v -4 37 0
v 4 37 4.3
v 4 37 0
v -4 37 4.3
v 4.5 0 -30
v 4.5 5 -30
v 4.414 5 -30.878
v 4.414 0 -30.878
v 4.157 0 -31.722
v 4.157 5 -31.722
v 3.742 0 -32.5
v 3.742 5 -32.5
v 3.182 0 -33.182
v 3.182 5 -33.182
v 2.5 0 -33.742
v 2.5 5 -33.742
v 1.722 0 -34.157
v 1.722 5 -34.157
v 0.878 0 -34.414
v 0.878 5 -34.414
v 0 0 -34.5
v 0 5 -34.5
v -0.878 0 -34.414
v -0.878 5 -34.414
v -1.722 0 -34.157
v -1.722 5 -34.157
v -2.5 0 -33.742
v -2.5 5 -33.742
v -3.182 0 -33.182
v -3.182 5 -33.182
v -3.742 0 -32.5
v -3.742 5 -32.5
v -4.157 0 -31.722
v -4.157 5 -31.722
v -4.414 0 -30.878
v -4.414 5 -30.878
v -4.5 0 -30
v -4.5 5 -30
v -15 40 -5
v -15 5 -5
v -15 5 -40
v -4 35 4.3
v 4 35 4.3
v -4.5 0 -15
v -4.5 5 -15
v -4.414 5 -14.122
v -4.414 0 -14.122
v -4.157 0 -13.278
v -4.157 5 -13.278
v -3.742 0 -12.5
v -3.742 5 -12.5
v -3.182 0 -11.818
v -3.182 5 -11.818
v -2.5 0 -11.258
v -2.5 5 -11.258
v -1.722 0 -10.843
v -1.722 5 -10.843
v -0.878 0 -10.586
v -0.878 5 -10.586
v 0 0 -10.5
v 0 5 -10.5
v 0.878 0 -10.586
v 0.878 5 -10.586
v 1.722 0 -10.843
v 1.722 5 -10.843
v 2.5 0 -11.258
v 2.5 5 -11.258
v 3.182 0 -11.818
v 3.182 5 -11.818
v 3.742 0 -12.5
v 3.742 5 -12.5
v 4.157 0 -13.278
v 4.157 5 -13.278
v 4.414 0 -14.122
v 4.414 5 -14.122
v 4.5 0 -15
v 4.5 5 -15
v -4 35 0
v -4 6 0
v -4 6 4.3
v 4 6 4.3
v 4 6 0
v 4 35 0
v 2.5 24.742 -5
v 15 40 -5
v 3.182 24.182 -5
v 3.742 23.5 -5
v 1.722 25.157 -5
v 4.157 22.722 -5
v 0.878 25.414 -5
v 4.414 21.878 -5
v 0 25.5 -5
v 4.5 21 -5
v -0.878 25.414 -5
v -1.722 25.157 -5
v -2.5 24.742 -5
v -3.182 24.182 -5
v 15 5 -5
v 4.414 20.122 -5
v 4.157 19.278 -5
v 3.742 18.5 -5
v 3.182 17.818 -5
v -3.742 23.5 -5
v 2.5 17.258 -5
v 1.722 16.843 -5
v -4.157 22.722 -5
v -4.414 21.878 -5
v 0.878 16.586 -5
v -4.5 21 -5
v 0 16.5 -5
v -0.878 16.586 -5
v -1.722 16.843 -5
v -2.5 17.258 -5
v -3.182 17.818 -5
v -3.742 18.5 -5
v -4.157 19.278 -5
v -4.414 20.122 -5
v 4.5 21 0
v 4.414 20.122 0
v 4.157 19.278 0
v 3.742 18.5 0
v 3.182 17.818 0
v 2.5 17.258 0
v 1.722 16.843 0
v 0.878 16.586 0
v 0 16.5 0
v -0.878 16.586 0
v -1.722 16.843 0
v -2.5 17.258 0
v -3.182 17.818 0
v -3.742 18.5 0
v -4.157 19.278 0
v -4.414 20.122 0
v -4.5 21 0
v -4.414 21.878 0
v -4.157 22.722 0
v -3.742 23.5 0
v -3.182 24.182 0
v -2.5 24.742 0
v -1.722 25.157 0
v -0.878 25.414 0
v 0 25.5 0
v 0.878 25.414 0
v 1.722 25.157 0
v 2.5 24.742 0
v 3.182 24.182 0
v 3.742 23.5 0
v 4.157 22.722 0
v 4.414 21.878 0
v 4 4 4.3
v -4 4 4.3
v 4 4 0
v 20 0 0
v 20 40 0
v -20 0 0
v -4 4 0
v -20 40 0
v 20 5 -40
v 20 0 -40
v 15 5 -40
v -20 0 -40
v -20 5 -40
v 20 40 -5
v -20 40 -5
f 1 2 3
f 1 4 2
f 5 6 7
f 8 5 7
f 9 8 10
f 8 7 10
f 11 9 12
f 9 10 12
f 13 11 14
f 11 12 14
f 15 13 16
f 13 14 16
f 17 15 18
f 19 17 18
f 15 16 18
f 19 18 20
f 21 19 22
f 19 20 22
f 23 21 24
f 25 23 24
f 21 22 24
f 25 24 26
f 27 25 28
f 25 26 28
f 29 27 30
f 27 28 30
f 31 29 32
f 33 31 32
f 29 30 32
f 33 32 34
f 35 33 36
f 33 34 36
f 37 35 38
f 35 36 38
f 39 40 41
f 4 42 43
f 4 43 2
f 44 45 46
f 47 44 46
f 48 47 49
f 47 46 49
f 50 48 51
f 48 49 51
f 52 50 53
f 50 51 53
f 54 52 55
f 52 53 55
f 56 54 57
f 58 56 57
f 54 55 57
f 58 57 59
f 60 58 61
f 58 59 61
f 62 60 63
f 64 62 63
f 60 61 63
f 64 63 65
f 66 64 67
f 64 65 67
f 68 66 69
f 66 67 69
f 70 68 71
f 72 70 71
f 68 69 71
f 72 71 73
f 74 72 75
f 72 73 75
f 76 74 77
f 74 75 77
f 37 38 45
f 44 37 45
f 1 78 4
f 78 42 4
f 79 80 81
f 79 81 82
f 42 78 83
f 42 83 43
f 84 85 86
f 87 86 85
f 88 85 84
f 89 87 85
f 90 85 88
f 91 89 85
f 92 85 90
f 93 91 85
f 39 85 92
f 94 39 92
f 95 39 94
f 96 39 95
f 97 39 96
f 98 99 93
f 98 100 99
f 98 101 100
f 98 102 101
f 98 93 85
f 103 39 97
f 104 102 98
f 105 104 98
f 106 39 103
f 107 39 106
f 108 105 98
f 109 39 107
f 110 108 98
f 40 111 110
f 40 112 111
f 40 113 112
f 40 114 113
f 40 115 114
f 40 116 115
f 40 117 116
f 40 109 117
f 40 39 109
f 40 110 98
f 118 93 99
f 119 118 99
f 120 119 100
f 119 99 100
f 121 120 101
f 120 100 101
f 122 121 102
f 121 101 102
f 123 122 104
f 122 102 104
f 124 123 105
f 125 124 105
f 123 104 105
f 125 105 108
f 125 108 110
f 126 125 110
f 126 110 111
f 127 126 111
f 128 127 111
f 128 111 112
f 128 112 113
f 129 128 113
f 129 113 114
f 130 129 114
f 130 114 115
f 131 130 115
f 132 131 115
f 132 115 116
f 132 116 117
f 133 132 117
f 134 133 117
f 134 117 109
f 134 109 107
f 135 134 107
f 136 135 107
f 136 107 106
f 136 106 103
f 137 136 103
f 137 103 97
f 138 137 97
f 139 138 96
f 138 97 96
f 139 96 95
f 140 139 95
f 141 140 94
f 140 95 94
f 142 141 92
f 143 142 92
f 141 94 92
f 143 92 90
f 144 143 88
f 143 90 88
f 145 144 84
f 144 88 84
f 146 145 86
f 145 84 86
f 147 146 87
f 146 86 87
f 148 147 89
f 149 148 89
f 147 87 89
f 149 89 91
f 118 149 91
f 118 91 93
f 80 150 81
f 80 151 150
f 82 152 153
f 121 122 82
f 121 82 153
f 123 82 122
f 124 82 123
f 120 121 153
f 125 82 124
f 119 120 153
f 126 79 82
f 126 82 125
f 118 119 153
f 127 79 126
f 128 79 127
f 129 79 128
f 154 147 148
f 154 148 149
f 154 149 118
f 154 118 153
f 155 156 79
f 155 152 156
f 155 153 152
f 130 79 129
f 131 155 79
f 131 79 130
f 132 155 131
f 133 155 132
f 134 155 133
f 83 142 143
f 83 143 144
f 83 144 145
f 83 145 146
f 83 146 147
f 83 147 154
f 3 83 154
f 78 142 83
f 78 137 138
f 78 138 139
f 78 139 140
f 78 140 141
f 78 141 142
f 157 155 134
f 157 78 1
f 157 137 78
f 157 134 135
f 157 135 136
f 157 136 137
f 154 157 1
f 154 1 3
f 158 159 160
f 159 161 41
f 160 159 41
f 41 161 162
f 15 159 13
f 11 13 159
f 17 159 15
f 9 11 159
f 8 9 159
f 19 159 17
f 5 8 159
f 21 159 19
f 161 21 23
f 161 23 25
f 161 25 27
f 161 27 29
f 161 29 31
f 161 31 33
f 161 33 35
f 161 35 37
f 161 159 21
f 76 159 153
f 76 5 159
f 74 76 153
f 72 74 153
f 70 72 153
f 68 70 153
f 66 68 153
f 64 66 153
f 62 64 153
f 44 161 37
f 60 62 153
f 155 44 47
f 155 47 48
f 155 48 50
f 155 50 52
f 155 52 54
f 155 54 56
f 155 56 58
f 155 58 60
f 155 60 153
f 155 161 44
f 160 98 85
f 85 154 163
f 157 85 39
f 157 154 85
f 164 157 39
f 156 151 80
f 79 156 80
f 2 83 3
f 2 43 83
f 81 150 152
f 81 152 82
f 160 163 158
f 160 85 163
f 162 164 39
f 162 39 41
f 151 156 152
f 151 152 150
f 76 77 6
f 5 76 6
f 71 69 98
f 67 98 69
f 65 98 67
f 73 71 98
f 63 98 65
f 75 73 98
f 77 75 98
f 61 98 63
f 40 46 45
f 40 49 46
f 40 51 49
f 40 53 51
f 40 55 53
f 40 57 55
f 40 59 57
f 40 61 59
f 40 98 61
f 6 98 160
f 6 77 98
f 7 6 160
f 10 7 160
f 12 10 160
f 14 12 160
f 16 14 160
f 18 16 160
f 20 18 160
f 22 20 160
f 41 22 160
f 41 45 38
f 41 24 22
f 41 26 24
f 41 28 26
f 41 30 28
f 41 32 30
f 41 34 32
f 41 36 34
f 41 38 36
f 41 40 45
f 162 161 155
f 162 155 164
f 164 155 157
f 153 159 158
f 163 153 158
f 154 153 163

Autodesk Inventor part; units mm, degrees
ref_plane "YZ Plane" through (0, 0, 0) normal (1, 0, 0) x (0, 1, 0)
ref_plane "XZ Plane" through (0, 0, 0) normal (0, 1, 0) x (-1, 0, 0)
ref_plane "XY Plane" through (0, 0, 0) normal (0, 0, 1) x (1, 0, 0)
sketch "Sketch1" plane through (0, 0, 0) normal (1, 0, 0) x (0, 1, 0)
  line L0 (0, 0) -> (40, 0)
  line L1 (40, 0) -> (40, -5)
  line L2 (40, -40) -> (5, -40) construction
  line L3 (0, -40) -> (0, 0)
  line L4 (40, 0) -> (40, -5)
  line L5 (40, -5) -> (5, -40)
  line L6 (0, -40) -> (5, -40)
  line L7 (40, -5) -> (5, -5)
  line L8 (5, -5) -> (5, -40)
  line L9 (40, -5) -> (40, -40) construction
  line L10 (5, -40) -> (0, -40)
  line L11 (37, 0) -> (35, 0)
  line L12 (35, 0) -> (35, 4.3)
  line L13 (35, 4.3) -> (37, 4.3)
  line L14 (37, 4.3) -> (37, 0)
  line L15 (6, 0) -> (4, 0)
  line L16 (4, 0) -> (4, 4.3)
  line L17 (4, 4.3) -> (6, 4.3)
  line L18 (6, 4.3) -> (6, 0)
  point P0 (5, 0)
  dimension "d0" = 40
  dimension "d1" = 5
  dimension "d2" = 2
  dimension "d3" = 4.3
  dimension "d4" = 4
  dimension "d5" = 3
extrude "Extrusion1" add sketch "Sketch1" along normal mid plane 40 contours L0 L1 L7 L8 L6 L3 | L8 L7 L5
extrude "Extrusion2" cut sketch "Sketch1" along normal mid plane 30 contours L8 L7 L5
extrude "Extrusion3" add sketch "Sketch1" along normal mid plane 8 contours L16 L17 L18 L0 | L12 L13 L14 L0
sketch "Sketch2" plane through (15, 5, -5) normal (0, 1, 0) x (-1, 0, 0)
  line L0 (15, -10) -> (15, -25) construction
  line L1 (10.5, -10) -> (10.5, -25)
  line L2 (19.5, -25) -> (19.5, -10)
  arc A0 (19.5, -10) -> (10.5, -10) centre (15, -10) ccw
  arc A1 (10.5, -25) -> (19.5, -25) centre (15, -25) ccw
  line L3 (30, 0) -> (0, 0) projected
  point P0 (15, 5)
  point P1 (15, -17.5)
  point P2 (15, 0)
  dimension "d12" = 15
  dimension "d13" = 9
  dimension "d14" = 10
extrude "Extrusion4" cut sketch "Sketch2" against normal through all
sketch "Sketch3" plane through (-15, 5, -5) normal (0, 0, -1) x (1, 0, 0)
  line L0 (-5, 5) -> (35, 5) projected
  circle A0 centre (15, -16) radius 4.5
  line L1 (0, -35) -> (30, -35) projected
  line L2 (15, -16) -> (15, -35) construction
  point P0 (15, 5)
  dimension "d18" = 9
  dimension "d21" = 19
extrude "Extrusion5" cut sketch "Sketch3" against normal through all
properties part number "Gusset_4040_8" material "Aluminum"
